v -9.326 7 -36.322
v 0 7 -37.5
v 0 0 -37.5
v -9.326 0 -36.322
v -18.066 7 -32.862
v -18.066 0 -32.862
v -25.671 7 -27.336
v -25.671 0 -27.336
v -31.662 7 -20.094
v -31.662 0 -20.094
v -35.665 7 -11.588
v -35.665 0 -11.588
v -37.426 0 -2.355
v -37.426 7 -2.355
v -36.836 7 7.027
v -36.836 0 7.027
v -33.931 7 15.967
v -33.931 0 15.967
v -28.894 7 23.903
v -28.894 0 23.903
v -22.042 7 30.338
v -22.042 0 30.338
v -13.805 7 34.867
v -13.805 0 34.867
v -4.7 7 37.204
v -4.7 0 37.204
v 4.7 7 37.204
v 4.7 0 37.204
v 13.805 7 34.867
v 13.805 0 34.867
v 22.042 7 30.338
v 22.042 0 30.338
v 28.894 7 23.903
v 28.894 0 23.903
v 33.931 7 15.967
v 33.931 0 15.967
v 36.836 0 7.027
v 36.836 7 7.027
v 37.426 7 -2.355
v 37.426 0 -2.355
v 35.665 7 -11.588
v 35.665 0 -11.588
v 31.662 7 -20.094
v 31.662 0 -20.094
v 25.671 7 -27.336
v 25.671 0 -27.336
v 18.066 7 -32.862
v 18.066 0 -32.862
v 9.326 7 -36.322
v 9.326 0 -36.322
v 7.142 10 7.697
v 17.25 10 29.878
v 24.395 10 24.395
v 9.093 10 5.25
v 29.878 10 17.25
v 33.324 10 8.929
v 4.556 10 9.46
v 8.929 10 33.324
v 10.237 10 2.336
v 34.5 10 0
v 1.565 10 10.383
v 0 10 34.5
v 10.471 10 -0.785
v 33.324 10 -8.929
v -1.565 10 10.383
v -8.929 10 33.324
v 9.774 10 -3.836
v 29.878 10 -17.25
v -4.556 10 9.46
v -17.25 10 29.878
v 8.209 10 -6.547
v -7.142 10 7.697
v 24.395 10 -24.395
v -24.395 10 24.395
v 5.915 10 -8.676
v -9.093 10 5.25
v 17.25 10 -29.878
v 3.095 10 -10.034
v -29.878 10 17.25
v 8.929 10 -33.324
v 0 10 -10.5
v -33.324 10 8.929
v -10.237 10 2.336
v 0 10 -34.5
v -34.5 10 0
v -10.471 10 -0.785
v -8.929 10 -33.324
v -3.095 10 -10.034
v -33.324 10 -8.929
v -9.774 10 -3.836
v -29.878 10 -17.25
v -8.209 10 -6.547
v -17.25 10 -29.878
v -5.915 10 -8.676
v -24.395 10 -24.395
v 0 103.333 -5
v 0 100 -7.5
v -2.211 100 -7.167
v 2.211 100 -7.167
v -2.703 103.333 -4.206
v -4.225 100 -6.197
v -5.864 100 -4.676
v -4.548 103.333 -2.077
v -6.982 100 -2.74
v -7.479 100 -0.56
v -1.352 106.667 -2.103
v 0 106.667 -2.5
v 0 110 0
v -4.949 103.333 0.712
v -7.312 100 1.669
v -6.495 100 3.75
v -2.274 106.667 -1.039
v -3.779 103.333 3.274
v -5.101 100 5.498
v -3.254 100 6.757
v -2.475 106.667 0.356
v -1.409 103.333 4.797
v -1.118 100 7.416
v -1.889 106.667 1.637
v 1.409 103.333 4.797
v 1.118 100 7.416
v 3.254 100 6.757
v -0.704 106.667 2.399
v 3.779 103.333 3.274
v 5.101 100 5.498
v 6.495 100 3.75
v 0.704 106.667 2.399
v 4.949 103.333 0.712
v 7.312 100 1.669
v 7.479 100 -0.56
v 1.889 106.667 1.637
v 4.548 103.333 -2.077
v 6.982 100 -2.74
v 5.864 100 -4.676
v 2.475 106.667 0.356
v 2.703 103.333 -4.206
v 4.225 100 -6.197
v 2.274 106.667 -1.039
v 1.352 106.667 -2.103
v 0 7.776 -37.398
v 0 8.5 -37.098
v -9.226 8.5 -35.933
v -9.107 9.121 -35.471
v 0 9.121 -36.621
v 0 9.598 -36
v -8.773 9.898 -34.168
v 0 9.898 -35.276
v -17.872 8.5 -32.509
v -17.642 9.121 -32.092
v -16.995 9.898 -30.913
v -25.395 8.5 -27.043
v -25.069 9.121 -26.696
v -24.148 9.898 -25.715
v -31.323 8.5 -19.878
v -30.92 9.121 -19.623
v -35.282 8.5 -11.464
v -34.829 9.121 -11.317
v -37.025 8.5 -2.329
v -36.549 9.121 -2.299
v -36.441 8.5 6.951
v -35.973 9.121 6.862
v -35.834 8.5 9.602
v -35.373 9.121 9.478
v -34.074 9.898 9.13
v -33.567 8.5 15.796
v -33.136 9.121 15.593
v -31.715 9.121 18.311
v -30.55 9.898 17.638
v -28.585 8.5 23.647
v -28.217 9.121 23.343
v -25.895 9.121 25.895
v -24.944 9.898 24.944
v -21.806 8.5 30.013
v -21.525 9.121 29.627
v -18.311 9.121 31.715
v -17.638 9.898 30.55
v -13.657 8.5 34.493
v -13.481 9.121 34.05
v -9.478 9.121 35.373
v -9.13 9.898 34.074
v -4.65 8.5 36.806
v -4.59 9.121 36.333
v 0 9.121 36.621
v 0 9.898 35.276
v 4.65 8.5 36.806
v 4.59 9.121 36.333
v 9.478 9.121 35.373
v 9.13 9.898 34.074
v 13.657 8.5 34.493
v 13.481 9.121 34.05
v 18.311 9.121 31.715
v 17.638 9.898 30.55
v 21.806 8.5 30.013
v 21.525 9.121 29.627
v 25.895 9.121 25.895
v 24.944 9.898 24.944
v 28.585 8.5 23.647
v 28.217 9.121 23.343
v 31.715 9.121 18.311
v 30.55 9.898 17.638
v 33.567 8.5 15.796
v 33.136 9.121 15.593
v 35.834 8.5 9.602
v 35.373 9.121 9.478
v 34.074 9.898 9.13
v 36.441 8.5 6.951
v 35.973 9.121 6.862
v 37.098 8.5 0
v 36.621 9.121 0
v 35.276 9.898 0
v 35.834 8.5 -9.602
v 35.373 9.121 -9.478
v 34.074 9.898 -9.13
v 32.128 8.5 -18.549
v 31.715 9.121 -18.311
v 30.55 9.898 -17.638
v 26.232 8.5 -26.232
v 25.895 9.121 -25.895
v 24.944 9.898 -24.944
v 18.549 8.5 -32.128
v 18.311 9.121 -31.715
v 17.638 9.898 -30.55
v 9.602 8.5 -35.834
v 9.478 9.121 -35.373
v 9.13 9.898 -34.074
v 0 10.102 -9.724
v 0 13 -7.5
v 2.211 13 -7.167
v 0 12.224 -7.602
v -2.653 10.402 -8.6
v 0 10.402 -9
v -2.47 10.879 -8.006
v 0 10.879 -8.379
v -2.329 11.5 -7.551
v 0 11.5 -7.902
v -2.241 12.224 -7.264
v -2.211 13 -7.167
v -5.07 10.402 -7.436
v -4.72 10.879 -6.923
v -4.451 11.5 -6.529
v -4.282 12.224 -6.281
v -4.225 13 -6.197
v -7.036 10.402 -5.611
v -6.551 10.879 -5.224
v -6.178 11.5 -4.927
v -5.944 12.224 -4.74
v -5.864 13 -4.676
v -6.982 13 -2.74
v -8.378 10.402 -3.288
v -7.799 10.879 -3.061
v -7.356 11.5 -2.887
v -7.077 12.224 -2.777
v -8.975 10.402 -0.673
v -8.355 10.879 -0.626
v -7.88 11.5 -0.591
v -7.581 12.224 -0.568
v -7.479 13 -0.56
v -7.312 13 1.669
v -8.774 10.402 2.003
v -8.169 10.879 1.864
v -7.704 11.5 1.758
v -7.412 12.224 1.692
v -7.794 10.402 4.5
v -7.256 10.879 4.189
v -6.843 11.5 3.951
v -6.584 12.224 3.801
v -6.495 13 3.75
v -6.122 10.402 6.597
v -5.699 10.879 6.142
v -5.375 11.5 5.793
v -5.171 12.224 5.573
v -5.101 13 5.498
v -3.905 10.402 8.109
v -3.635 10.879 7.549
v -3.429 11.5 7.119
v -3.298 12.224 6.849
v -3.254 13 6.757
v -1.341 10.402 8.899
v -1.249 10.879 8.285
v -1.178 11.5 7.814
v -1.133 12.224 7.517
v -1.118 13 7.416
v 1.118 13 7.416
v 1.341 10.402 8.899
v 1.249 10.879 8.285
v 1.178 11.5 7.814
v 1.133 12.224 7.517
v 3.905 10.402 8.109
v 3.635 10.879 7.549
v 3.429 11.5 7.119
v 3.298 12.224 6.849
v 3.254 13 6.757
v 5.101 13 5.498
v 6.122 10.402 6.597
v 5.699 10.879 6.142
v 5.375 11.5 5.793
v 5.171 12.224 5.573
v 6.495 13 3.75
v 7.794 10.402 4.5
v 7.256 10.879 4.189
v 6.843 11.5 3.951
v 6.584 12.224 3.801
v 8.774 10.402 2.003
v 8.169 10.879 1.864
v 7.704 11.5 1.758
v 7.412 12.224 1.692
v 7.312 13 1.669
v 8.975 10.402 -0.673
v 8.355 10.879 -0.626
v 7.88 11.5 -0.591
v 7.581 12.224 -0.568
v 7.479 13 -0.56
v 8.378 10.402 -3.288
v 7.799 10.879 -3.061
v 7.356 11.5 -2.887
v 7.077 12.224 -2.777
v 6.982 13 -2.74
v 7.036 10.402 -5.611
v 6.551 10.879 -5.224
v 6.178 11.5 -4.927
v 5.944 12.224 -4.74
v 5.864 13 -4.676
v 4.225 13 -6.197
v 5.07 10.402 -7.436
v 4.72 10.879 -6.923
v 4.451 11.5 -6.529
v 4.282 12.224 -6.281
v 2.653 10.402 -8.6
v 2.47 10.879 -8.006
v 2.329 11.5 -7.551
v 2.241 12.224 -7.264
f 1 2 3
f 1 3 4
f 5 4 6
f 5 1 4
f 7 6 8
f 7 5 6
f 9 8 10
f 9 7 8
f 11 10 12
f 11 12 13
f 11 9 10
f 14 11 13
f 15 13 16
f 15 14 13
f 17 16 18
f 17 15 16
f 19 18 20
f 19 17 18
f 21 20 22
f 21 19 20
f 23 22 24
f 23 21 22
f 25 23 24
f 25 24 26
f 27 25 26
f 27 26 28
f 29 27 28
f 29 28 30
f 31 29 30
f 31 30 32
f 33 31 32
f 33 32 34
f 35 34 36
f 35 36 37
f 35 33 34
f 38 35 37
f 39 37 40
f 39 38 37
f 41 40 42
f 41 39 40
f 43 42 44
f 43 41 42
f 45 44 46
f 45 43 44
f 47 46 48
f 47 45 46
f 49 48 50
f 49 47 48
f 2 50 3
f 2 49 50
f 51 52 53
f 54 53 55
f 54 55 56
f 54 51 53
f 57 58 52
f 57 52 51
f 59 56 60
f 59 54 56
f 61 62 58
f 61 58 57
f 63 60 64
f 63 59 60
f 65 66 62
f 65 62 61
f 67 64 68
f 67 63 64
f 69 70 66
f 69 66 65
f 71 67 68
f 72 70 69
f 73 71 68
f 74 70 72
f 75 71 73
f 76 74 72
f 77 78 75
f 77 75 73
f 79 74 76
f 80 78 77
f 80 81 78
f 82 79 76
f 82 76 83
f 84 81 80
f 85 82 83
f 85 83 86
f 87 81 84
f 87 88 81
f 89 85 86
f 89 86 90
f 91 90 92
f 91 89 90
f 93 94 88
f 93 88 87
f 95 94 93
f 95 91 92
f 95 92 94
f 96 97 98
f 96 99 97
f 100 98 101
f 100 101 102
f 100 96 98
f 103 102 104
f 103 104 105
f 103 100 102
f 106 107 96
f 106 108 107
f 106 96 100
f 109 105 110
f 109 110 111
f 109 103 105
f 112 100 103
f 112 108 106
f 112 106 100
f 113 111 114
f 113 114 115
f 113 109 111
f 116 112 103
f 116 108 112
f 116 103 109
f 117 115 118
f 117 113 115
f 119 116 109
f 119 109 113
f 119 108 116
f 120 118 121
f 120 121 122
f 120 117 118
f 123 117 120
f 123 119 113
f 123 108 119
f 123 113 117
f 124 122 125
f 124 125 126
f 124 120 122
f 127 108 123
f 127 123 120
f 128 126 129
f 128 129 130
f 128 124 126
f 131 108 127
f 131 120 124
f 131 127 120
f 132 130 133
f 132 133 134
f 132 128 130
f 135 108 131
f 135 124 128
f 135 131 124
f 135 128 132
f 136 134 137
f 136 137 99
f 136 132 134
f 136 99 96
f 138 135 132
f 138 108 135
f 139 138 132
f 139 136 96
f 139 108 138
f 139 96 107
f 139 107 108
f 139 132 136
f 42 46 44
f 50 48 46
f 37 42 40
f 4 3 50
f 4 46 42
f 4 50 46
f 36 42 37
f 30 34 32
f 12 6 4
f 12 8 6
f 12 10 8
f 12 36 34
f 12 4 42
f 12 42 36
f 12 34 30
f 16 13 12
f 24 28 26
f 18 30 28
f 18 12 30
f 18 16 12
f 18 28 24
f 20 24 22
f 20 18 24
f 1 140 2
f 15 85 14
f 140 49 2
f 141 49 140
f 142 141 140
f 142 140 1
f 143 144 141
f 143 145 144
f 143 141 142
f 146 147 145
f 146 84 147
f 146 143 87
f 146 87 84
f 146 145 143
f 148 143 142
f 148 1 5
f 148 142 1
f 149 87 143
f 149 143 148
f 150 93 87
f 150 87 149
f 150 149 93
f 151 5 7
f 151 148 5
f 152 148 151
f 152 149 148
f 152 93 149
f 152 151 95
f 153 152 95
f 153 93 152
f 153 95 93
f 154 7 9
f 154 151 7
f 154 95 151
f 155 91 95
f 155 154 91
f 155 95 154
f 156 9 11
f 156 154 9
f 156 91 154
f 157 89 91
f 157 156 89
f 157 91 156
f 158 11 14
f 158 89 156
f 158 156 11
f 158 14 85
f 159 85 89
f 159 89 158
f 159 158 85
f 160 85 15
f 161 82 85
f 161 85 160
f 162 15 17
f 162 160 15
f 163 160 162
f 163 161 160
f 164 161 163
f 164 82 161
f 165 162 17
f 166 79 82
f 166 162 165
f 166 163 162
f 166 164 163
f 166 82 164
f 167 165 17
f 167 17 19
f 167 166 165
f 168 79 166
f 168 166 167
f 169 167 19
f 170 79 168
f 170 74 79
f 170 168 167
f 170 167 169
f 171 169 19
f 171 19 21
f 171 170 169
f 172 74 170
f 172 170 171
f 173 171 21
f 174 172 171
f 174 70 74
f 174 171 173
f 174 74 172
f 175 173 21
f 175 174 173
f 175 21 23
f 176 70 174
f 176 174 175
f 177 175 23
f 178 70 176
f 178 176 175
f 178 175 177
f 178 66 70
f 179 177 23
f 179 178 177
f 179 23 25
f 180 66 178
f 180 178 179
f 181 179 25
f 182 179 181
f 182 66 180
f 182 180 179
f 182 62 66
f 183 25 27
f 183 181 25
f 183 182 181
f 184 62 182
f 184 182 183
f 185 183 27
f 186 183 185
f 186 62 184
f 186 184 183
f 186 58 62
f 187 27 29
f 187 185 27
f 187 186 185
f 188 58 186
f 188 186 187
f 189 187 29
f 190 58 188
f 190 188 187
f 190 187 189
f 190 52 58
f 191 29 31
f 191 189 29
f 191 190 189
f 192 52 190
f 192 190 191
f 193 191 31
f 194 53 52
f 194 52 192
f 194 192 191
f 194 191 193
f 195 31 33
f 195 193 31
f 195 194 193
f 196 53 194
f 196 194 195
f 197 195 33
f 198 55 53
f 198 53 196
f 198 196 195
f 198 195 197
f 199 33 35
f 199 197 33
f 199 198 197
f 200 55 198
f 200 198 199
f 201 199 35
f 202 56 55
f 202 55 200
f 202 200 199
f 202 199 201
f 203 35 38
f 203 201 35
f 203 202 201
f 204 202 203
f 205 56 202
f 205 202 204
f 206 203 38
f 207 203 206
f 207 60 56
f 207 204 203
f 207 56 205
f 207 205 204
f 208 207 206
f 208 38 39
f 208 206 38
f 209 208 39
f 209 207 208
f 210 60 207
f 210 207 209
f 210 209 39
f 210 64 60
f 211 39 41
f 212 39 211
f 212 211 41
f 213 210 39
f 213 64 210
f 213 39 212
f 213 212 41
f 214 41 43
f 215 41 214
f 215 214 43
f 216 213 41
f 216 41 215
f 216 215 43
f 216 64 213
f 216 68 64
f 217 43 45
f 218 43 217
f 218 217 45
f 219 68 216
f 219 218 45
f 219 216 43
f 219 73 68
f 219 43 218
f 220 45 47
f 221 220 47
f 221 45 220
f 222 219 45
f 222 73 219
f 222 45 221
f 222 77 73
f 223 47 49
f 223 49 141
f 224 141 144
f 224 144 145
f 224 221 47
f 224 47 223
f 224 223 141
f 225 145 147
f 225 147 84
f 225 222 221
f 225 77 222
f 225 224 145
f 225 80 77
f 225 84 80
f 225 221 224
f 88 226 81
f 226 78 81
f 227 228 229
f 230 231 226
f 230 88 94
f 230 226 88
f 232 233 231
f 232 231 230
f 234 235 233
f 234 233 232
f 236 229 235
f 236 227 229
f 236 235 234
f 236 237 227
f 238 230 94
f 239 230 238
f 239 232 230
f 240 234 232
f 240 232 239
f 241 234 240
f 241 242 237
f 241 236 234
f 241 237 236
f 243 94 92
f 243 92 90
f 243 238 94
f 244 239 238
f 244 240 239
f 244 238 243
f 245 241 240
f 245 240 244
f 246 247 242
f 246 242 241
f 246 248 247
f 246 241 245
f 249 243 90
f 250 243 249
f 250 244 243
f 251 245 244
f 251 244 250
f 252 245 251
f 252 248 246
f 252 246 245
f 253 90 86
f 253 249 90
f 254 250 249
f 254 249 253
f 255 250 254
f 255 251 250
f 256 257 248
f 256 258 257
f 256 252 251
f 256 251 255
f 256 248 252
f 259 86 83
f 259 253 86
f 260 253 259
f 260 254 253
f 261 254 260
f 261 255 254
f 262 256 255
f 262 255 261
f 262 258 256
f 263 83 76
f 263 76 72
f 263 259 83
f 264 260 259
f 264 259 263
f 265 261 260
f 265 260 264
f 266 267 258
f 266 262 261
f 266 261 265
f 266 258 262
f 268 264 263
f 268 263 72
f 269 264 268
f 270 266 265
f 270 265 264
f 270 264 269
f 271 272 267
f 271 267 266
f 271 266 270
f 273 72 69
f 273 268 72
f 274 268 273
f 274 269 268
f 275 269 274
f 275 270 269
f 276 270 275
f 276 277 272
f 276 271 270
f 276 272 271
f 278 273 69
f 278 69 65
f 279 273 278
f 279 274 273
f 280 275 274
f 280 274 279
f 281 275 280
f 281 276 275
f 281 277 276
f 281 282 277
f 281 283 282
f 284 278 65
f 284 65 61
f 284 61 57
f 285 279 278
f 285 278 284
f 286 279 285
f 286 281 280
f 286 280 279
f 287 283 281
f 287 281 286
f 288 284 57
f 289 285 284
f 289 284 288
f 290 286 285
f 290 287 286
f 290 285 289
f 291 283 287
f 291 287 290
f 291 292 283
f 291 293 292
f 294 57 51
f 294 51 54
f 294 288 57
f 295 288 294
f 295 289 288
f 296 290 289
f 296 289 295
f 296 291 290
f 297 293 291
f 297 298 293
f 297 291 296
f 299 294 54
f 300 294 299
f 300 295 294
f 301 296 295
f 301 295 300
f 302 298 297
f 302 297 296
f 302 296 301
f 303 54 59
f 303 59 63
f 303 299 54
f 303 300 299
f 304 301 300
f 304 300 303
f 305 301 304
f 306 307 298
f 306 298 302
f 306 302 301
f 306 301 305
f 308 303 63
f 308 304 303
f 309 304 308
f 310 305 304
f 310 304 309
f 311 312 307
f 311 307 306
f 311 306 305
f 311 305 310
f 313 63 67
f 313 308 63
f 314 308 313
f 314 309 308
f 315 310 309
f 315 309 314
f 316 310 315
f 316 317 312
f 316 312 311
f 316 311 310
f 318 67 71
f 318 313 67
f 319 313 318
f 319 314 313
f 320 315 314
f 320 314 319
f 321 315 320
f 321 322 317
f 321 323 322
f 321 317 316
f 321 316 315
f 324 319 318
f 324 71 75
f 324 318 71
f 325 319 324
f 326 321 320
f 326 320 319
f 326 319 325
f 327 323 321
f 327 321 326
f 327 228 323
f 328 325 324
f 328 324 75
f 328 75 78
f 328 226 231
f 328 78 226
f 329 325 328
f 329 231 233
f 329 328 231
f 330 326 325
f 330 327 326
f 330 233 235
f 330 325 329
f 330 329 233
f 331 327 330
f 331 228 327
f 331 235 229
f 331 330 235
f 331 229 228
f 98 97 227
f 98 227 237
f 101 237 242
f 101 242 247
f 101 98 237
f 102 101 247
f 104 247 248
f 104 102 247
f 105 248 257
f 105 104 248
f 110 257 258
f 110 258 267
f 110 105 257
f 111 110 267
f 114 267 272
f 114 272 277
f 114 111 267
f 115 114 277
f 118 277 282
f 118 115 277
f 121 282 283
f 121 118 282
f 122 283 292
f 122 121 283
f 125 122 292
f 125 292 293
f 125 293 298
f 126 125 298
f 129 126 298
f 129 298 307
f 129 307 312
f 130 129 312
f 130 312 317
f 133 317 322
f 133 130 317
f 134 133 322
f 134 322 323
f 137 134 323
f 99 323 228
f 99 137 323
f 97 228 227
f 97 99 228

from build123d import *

# Parameters (mm, degrees)
RADYUS1_R = 3


with BuildPart() as part:
    # Çizim1 → Döndür1 (revolve)
    with BuildSketch(Plane.XY, mode=Mode.PRIVATE) as d_nd_r1_sk:
        Polygon((0, 0), (37.5, 0), (37.5, 10), (7.5, 10), (7.5, 100), (0, 110), align=None)
    revolve(d_nd_r1_sk.sketch.rotate(Axis((0, 0, 0), (0, 1, 0)), 90), axis=Axis((0, 0, 0), (0, 1, 0)))

    # Radyus1
    radyus1_edges = [part.edges().sort_by_distance(p)[0] for p in [
        (0, 10, 7.5),
        (0, 10, 37.5),
    ]]
    fillet(radyus1_edges, radius=RADYUS1_R)


solid = part.part
